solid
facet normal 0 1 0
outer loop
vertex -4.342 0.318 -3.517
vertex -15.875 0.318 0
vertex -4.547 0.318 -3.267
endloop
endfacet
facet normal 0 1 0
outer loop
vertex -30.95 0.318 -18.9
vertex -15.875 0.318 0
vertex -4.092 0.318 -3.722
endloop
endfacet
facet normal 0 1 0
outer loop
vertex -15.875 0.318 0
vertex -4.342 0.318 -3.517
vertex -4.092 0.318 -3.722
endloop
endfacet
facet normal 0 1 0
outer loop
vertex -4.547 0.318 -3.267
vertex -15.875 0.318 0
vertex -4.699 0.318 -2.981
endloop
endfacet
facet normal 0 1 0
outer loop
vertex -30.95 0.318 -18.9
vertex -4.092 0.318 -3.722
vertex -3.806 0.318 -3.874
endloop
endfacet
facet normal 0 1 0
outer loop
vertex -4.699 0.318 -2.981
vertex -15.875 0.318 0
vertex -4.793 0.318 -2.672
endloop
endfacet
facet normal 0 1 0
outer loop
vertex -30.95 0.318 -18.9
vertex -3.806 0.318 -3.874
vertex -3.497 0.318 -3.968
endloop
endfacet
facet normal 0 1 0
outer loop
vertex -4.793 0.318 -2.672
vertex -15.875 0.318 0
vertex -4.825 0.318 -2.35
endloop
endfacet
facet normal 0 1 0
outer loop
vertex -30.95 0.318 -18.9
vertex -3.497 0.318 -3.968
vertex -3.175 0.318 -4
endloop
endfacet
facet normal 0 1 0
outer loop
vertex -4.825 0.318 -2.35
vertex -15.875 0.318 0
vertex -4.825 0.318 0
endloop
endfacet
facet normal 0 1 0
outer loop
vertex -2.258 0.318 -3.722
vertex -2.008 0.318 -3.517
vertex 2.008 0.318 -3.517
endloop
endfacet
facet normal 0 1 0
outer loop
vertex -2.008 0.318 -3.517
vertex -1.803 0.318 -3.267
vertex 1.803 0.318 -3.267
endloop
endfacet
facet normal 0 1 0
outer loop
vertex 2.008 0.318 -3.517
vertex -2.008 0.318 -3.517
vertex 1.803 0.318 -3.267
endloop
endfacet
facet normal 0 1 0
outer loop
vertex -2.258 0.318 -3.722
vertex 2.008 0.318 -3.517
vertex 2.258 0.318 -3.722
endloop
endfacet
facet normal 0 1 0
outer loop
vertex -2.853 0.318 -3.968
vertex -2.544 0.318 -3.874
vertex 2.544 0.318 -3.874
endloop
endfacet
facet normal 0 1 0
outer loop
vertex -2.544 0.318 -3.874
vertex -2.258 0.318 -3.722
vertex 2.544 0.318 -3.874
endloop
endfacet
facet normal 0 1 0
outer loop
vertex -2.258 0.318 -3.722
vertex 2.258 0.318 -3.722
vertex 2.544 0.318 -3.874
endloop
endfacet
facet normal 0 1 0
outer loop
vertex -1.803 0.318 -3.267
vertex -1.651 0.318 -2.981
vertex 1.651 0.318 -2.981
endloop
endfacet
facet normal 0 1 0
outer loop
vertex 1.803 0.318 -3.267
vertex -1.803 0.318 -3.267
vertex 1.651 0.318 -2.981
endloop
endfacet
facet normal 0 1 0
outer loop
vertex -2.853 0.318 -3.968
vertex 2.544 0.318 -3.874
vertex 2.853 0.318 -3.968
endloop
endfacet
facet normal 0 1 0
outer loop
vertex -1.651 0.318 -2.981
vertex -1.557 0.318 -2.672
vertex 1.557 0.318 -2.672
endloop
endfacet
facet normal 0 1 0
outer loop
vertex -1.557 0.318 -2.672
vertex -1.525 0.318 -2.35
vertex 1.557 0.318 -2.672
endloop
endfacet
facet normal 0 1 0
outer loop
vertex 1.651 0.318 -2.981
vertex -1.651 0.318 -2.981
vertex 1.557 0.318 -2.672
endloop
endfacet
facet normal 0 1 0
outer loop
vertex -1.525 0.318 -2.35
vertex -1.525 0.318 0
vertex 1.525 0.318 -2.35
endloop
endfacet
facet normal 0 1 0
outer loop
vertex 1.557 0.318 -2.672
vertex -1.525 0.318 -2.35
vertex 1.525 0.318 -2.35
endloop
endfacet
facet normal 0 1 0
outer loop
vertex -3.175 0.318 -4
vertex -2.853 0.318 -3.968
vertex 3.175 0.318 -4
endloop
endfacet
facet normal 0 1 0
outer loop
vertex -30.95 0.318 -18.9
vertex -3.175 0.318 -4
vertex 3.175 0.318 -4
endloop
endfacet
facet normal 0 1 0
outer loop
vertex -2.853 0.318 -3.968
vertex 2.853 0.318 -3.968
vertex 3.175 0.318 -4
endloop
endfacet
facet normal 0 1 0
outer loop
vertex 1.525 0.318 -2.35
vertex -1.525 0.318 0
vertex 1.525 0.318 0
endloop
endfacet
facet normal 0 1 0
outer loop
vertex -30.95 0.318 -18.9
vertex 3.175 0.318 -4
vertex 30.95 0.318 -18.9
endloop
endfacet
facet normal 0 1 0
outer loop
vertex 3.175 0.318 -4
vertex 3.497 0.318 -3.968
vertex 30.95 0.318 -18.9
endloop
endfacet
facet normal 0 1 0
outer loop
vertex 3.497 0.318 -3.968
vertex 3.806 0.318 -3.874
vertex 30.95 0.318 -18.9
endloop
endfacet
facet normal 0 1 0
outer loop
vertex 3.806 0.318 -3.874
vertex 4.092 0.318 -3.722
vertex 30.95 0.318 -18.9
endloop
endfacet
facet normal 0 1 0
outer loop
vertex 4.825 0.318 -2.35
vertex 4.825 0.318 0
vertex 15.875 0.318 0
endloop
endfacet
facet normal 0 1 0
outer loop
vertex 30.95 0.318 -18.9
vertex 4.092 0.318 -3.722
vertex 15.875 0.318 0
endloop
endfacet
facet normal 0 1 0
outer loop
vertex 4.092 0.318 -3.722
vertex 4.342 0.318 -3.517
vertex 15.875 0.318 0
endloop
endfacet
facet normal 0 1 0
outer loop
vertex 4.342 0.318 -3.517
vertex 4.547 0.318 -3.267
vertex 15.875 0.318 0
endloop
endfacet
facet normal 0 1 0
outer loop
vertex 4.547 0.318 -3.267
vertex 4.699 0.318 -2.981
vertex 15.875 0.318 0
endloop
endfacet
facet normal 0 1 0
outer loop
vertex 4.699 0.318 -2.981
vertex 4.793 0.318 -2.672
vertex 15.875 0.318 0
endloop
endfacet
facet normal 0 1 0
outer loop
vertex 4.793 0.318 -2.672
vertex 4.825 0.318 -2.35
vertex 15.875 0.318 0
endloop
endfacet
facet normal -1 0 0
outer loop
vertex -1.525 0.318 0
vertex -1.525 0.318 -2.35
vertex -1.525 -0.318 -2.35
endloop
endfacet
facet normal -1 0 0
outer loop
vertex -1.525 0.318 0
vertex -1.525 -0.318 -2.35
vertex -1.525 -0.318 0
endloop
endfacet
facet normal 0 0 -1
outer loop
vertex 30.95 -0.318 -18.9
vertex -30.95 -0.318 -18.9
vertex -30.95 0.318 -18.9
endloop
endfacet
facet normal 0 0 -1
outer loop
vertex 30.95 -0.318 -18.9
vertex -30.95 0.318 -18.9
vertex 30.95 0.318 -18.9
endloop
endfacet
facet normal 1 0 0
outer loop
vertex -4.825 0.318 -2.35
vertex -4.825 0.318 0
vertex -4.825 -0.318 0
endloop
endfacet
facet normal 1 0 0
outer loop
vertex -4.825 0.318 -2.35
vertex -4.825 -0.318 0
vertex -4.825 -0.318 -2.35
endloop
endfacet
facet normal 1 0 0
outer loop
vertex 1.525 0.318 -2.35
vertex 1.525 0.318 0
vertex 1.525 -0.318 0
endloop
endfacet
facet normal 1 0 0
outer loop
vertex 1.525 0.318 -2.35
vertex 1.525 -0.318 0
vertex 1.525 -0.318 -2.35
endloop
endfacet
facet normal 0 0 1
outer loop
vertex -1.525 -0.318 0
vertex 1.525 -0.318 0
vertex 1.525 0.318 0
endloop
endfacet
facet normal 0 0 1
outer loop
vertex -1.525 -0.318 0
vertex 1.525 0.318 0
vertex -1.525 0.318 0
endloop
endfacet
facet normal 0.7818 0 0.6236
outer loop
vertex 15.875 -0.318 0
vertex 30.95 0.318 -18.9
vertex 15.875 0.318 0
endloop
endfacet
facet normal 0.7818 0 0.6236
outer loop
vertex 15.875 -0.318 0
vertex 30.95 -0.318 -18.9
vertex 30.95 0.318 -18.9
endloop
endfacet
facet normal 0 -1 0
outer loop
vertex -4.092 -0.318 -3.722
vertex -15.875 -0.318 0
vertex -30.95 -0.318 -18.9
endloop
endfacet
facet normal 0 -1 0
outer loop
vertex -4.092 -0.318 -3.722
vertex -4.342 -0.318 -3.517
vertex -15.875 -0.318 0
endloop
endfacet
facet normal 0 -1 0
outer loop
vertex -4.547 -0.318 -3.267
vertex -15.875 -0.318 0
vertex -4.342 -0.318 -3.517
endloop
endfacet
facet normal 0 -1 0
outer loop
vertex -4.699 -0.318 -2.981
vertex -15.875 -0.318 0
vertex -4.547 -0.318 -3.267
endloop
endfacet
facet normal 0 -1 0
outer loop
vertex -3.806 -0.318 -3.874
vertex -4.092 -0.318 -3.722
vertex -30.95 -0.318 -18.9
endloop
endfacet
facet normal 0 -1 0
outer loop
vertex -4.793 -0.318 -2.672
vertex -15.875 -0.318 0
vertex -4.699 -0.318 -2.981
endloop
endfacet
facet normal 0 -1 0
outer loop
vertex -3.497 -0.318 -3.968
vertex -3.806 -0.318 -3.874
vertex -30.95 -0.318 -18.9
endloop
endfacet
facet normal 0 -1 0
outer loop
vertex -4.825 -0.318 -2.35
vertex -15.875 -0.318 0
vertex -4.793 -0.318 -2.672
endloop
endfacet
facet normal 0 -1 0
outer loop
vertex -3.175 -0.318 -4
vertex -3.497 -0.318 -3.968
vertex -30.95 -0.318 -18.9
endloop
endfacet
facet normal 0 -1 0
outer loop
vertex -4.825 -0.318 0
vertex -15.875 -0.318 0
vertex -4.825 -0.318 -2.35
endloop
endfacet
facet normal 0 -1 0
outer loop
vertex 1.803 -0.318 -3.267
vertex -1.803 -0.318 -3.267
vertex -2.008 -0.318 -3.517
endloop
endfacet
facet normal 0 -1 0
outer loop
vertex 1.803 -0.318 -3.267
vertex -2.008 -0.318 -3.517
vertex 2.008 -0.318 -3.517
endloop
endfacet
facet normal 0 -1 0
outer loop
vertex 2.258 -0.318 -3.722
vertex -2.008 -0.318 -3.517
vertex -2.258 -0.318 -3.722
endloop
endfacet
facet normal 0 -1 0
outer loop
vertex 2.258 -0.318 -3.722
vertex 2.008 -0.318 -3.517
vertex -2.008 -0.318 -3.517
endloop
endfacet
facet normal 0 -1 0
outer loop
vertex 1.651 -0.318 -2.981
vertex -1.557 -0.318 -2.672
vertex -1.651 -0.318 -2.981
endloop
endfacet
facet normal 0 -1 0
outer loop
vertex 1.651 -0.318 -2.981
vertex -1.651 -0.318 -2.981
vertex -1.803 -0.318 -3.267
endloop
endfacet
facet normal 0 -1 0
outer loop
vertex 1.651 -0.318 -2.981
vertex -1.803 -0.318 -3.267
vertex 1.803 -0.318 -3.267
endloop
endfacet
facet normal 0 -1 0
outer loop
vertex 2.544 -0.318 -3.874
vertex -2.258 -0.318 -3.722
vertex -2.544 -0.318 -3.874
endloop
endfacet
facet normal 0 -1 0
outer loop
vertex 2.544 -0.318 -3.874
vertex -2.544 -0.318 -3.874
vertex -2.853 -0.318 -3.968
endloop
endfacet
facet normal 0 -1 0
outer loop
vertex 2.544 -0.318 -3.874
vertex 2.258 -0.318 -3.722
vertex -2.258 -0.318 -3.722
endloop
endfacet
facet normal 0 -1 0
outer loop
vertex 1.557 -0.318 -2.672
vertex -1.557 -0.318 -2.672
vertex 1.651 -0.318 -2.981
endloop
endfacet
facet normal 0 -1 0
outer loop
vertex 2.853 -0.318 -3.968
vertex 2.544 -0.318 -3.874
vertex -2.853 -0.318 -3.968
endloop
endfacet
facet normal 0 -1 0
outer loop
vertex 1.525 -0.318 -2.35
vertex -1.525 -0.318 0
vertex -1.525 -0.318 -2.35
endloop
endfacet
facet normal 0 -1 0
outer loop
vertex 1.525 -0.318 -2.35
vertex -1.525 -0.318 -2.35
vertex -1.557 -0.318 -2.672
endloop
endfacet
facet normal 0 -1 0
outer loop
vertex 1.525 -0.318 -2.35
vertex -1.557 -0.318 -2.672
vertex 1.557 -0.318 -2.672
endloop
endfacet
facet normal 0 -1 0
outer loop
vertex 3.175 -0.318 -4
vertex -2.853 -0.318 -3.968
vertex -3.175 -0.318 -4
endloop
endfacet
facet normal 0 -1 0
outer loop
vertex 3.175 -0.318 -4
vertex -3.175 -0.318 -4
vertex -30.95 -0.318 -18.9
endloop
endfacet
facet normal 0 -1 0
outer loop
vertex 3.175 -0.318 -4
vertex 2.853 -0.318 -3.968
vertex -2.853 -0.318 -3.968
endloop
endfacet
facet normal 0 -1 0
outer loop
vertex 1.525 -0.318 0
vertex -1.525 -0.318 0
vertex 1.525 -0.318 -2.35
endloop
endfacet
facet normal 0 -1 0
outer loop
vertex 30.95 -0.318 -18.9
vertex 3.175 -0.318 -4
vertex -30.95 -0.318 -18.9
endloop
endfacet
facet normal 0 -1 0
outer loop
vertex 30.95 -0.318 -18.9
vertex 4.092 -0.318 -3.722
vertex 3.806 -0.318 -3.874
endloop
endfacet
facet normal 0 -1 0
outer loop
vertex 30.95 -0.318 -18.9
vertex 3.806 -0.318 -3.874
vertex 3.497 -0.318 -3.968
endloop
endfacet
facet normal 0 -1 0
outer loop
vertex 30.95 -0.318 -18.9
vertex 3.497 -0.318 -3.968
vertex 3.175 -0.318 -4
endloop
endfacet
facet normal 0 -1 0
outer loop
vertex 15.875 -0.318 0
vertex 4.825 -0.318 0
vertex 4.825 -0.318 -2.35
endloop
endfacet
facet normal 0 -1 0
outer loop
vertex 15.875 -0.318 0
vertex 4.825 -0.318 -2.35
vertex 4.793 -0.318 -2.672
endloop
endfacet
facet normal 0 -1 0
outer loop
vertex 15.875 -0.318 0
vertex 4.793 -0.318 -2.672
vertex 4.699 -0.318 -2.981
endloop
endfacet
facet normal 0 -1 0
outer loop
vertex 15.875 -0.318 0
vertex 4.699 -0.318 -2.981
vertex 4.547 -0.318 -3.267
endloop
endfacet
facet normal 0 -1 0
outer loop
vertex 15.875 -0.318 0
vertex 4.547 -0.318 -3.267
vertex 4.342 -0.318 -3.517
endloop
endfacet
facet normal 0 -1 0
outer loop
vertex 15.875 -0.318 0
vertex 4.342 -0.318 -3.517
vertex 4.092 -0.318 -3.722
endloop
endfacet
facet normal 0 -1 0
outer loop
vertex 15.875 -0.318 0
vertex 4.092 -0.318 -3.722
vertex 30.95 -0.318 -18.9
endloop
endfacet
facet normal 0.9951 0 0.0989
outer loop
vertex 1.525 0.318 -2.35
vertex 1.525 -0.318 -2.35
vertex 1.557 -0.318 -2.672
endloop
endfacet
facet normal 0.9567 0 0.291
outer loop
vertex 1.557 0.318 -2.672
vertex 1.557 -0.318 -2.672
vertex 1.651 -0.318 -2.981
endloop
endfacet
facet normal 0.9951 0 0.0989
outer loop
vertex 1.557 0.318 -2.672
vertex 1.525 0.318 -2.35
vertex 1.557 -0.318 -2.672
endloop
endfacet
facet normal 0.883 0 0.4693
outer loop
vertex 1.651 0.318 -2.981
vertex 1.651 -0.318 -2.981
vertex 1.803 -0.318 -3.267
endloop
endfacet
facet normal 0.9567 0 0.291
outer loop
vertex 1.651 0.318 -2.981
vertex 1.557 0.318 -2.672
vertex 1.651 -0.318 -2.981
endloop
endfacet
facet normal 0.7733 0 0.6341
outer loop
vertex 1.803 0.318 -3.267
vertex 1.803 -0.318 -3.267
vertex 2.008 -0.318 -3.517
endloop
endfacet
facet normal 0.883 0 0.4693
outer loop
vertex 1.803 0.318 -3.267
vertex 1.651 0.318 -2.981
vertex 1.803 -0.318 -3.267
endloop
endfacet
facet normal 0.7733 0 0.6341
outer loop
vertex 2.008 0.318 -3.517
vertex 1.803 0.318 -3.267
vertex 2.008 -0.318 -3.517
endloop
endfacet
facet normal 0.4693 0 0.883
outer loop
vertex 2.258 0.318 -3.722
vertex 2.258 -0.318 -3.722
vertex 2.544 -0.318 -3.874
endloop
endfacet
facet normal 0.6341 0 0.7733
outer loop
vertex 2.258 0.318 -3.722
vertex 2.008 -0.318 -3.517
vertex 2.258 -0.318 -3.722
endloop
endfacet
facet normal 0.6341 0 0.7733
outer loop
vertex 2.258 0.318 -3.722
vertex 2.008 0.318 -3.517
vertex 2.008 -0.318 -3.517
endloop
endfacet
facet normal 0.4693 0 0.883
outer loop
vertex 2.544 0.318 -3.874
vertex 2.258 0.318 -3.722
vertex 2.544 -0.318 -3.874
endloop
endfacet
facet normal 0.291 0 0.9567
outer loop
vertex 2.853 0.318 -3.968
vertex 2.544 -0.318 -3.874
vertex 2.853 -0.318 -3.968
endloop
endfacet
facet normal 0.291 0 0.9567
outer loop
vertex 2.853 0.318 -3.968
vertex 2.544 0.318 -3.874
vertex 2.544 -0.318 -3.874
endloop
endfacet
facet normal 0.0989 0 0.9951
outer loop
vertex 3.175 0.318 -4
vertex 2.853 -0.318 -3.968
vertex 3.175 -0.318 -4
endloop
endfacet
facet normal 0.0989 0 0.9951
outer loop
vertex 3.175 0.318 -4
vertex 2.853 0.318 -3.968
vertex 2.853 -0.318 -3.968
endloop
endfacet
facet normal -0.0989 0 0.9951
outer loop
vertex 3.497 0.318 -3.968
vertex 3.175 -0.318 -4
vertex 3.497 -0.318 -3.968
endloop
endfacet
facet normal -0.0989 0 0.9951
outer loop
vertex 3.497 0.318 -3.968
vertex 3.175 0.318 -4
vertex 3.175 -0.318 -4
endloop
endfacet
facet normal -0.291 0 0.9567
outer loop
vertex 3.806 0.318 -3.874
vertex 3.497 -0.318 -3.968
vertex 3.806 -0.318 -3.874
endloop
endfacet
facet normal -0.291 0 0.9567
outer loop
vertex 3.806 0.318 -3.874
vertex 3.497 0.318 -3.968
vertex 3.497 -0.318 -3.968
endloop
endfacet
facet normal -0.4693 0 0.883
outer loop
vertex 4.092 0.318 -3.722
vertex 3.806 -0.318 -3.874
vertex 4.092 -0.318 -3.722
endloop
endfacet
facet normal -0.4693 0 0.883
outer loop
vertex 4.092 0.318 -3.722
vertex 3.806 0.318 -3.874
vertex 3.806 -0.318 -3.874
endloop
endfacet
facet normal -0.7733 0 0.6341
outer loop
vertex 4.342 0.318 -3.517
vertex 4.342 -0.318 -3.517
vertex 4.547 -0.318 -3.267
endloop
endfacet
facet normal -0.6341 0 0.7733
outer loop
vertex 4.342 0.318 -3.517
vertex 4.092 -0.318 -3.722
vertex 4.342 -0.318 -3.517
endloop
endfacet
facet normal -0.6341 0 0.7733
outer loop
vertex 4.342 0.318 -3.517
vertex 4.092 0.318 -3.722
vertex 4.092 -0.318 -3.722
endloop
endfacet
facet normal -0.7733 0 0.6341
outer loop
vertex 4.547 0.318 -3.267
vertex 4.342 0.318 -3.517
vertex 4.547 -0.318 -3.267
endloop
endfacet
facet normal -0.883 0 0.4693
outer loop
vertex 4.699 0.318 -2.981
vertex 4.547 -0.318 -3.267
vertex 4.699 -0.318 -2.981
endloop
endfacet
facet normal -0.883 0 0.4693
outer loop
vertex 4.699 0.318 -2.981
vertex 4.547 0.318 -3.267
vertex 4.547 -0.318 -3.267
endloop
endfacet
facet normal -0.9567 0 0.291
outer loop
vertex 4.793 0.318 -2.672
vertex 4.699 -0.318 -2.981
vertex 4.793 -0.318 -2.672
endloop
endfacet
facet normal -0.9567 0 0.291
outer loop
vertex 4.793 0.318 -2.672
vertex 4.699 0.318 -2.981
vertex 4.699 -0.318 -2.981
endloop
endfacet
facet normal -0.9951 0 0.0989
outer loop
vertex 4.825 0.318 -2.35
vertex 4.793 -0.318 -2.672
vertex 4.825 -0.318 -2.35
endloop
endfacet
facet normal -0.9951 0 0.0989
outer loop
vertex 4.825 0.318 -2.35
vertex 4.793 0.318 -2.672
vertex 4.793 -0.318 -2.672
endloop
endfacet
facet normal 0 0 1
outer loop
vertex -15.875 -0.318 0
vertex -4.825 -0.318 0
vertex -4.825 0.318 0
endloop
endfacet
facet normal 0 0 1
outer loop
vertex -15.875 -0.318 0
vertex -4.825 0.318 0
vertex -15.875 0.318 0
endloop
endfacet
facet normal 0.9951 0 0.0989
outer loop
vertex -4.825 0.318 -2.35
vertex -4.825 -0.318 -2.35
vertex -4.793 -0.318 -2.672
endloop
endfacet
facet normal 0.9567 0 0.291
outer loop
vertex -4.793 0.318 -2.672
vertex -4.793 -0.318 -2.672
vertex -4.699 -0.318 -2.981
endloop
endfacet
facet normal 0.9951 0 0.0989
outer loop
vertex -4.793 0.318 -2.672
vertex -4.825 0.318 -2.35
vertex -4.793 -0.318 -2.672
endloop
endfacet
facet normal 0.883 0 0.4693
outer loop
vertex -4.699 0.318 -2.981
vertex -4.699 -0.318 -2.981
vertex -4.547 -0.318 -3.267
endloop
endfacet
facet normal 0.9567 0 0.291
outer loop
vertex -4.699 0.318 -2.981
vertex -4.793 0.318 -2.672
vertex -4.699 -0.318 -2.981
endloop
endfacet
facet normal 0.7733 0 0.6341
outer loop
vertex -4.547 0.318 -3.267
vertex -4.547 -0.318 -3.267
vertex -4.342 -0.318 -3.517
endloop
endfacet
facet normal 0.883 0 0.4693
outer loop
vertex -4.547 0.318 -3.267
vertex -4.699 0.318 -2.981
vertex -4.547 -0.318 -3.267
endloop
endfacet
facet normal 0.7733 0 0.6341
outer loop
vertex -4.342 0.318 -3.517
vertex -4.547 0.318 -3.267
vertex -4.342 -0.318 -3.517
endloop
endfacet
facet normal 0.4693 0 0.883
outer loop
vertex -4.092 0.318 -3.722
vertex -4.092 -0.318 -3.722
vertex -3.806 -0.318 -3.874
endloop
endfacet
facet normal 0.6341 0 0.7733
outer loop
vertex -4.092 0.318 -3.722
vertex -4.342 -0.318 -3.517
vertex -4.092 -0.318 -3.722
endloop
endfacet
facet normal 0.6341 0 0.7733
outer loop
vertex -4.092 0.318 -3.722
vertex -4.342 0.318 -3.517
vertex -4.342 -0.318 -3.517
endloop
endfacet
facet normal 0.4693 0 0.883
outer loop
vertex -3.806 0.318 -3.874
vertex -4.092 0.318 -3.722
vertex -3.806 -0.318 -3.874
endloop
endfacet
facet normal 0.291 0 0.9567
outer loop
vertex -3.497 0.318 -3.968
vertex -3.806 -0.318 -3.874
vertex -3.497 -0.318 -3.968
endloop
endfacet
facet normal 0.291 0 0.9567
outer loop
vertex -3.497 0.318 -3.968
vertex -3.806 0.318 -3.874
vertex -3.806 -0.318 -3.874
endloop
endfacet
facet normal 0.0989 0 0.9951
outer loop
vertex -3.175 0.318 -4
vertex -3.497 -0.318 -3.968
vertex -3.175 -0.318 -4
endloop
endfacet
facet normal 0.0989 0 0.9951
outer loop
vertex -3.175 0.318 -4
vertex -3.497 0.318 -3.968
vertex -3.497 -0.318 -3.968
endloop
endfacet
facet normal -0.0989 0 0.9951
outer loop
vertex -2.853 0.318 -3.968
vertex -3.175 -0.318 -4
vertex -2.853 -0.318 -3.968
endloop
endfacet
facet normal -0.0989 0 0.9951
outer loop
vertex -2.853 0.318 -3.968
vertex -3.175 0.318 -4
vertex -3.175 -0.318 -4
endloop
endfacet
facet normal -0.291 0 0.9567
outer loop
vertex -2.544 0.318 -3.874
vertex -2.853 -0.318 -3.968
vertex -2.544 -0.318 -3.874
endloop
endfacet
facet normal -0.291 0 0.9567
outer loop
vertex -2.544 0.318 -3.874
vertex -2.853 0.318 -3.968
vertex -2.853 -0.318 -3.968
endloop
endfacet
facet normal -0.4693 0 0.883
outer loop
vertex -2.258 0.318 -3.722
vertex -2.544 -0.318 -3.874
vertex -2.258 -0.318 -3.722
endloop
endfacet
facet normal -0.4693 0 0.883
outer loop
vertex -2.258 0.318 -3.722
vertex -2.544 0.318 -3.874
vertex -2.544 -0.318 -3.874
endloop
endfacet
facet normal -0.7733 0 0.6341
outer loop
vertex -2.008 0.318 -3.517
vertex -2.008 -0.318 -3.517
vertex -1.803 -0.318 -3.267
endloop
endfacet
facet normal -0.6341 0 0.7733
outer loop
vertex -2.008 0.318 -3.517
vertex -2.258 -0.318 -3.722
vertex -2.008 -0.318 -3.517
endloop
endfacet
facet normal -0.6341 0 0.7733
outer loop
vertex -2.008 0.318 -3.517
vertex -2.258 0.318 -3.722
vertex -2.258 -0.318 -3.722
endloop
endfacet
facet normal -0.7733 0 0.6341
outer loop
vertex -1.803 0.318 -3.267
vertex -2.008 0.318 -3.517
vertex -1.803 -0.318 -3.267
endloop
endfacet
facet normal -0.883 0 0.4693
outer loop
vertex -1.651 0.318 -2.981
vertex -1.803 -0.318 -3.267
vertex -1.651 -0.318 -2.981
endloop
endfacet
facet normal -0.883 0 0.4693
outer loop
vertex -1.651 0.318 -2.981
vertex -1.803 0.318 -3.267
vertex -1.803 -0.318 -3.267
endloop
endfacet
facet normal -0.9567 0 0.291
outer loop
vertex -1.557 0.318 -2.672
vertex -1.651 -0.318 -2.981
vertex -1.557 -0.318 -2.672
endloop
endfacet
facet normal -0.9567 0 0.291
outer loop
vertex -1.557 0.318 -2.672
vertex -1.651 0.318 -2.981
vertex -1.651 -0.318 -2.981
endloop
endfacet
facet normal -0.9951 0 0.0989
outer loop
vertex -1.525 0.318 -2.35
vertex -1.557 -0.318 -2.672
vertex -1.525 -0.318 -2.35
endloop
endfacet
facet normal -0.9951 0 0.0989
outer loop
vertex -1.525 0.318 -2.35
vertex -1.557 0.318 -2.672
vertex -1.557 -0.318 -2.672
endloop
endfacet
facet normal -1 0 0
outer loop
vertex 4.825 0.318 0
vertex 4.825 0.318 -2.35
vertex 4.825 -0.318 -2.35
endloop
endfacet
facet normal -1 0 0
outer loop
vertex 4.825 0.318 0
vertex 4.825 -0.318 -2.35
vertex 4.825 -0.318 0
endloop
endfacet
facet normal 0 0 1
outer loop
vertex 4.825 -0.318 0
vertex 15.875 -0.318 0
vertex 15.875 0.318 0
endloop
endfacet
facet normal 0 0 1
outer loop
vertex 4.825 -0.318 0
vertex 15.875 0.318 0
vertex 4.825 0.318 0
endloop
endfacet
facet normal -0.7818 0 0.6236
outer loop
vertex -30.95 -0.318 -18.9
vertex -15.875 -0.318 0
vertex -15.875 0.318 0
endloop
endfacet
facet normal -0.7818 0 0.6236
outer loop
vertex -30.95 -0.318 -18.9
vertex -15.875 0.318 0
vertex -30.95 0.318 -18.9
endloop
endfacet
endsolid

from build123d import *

# Parameters (mm, degrees)
F1_DEPTH      = 0.3175
F3_DEPTH      = 0.3185
F3_DEPTH_BACK = 0.3185


with BuildPart() as f1:
    # F0 (on Front) → F1 (new body, symmetric)
    with BuildSketch(Plane.XZ):
        Polygon((15.875, 0), (-15.875, 0), (-30.95, -18.9), (30.95, -18.9), align=None)
    extrude(amount=F1_DEPTH, both=True)

    # F2 (on Front) → F3 (cut, two sides)
    with BuildSketch(Plane.XZ) as f3_sk:
        with BuildLine():
            Line((-1.525, 0), (-4.825, 0))
            Line((-4.825, 0), (-4.825, -2.35))
            ThreePointArc((-4.825, -2.35), (-3.175, -4), (-1.525, -2.35))
            Line((-1.525, -2.35), (-1.525, 0))
        make_face()
        with BuildLine():
            Line((4.825, -2.35), (4.825, 0))
            Line((4.825, 0), (1.525, 0))
            Line((1.525, 0), (1.525, -2.35))
            ThreePointArc((1.525, -2.35), (3.175, -4), (4.825, -2.35))
        make_face()
    extrude(amount=-F3_DEPTH, mode=Mode.SUBTRACT)
    extrude(f3_sk.sketch, amount=F3_DEPTH_BACK, mode=Mode.SUBTRACT)


solid = f1.part
